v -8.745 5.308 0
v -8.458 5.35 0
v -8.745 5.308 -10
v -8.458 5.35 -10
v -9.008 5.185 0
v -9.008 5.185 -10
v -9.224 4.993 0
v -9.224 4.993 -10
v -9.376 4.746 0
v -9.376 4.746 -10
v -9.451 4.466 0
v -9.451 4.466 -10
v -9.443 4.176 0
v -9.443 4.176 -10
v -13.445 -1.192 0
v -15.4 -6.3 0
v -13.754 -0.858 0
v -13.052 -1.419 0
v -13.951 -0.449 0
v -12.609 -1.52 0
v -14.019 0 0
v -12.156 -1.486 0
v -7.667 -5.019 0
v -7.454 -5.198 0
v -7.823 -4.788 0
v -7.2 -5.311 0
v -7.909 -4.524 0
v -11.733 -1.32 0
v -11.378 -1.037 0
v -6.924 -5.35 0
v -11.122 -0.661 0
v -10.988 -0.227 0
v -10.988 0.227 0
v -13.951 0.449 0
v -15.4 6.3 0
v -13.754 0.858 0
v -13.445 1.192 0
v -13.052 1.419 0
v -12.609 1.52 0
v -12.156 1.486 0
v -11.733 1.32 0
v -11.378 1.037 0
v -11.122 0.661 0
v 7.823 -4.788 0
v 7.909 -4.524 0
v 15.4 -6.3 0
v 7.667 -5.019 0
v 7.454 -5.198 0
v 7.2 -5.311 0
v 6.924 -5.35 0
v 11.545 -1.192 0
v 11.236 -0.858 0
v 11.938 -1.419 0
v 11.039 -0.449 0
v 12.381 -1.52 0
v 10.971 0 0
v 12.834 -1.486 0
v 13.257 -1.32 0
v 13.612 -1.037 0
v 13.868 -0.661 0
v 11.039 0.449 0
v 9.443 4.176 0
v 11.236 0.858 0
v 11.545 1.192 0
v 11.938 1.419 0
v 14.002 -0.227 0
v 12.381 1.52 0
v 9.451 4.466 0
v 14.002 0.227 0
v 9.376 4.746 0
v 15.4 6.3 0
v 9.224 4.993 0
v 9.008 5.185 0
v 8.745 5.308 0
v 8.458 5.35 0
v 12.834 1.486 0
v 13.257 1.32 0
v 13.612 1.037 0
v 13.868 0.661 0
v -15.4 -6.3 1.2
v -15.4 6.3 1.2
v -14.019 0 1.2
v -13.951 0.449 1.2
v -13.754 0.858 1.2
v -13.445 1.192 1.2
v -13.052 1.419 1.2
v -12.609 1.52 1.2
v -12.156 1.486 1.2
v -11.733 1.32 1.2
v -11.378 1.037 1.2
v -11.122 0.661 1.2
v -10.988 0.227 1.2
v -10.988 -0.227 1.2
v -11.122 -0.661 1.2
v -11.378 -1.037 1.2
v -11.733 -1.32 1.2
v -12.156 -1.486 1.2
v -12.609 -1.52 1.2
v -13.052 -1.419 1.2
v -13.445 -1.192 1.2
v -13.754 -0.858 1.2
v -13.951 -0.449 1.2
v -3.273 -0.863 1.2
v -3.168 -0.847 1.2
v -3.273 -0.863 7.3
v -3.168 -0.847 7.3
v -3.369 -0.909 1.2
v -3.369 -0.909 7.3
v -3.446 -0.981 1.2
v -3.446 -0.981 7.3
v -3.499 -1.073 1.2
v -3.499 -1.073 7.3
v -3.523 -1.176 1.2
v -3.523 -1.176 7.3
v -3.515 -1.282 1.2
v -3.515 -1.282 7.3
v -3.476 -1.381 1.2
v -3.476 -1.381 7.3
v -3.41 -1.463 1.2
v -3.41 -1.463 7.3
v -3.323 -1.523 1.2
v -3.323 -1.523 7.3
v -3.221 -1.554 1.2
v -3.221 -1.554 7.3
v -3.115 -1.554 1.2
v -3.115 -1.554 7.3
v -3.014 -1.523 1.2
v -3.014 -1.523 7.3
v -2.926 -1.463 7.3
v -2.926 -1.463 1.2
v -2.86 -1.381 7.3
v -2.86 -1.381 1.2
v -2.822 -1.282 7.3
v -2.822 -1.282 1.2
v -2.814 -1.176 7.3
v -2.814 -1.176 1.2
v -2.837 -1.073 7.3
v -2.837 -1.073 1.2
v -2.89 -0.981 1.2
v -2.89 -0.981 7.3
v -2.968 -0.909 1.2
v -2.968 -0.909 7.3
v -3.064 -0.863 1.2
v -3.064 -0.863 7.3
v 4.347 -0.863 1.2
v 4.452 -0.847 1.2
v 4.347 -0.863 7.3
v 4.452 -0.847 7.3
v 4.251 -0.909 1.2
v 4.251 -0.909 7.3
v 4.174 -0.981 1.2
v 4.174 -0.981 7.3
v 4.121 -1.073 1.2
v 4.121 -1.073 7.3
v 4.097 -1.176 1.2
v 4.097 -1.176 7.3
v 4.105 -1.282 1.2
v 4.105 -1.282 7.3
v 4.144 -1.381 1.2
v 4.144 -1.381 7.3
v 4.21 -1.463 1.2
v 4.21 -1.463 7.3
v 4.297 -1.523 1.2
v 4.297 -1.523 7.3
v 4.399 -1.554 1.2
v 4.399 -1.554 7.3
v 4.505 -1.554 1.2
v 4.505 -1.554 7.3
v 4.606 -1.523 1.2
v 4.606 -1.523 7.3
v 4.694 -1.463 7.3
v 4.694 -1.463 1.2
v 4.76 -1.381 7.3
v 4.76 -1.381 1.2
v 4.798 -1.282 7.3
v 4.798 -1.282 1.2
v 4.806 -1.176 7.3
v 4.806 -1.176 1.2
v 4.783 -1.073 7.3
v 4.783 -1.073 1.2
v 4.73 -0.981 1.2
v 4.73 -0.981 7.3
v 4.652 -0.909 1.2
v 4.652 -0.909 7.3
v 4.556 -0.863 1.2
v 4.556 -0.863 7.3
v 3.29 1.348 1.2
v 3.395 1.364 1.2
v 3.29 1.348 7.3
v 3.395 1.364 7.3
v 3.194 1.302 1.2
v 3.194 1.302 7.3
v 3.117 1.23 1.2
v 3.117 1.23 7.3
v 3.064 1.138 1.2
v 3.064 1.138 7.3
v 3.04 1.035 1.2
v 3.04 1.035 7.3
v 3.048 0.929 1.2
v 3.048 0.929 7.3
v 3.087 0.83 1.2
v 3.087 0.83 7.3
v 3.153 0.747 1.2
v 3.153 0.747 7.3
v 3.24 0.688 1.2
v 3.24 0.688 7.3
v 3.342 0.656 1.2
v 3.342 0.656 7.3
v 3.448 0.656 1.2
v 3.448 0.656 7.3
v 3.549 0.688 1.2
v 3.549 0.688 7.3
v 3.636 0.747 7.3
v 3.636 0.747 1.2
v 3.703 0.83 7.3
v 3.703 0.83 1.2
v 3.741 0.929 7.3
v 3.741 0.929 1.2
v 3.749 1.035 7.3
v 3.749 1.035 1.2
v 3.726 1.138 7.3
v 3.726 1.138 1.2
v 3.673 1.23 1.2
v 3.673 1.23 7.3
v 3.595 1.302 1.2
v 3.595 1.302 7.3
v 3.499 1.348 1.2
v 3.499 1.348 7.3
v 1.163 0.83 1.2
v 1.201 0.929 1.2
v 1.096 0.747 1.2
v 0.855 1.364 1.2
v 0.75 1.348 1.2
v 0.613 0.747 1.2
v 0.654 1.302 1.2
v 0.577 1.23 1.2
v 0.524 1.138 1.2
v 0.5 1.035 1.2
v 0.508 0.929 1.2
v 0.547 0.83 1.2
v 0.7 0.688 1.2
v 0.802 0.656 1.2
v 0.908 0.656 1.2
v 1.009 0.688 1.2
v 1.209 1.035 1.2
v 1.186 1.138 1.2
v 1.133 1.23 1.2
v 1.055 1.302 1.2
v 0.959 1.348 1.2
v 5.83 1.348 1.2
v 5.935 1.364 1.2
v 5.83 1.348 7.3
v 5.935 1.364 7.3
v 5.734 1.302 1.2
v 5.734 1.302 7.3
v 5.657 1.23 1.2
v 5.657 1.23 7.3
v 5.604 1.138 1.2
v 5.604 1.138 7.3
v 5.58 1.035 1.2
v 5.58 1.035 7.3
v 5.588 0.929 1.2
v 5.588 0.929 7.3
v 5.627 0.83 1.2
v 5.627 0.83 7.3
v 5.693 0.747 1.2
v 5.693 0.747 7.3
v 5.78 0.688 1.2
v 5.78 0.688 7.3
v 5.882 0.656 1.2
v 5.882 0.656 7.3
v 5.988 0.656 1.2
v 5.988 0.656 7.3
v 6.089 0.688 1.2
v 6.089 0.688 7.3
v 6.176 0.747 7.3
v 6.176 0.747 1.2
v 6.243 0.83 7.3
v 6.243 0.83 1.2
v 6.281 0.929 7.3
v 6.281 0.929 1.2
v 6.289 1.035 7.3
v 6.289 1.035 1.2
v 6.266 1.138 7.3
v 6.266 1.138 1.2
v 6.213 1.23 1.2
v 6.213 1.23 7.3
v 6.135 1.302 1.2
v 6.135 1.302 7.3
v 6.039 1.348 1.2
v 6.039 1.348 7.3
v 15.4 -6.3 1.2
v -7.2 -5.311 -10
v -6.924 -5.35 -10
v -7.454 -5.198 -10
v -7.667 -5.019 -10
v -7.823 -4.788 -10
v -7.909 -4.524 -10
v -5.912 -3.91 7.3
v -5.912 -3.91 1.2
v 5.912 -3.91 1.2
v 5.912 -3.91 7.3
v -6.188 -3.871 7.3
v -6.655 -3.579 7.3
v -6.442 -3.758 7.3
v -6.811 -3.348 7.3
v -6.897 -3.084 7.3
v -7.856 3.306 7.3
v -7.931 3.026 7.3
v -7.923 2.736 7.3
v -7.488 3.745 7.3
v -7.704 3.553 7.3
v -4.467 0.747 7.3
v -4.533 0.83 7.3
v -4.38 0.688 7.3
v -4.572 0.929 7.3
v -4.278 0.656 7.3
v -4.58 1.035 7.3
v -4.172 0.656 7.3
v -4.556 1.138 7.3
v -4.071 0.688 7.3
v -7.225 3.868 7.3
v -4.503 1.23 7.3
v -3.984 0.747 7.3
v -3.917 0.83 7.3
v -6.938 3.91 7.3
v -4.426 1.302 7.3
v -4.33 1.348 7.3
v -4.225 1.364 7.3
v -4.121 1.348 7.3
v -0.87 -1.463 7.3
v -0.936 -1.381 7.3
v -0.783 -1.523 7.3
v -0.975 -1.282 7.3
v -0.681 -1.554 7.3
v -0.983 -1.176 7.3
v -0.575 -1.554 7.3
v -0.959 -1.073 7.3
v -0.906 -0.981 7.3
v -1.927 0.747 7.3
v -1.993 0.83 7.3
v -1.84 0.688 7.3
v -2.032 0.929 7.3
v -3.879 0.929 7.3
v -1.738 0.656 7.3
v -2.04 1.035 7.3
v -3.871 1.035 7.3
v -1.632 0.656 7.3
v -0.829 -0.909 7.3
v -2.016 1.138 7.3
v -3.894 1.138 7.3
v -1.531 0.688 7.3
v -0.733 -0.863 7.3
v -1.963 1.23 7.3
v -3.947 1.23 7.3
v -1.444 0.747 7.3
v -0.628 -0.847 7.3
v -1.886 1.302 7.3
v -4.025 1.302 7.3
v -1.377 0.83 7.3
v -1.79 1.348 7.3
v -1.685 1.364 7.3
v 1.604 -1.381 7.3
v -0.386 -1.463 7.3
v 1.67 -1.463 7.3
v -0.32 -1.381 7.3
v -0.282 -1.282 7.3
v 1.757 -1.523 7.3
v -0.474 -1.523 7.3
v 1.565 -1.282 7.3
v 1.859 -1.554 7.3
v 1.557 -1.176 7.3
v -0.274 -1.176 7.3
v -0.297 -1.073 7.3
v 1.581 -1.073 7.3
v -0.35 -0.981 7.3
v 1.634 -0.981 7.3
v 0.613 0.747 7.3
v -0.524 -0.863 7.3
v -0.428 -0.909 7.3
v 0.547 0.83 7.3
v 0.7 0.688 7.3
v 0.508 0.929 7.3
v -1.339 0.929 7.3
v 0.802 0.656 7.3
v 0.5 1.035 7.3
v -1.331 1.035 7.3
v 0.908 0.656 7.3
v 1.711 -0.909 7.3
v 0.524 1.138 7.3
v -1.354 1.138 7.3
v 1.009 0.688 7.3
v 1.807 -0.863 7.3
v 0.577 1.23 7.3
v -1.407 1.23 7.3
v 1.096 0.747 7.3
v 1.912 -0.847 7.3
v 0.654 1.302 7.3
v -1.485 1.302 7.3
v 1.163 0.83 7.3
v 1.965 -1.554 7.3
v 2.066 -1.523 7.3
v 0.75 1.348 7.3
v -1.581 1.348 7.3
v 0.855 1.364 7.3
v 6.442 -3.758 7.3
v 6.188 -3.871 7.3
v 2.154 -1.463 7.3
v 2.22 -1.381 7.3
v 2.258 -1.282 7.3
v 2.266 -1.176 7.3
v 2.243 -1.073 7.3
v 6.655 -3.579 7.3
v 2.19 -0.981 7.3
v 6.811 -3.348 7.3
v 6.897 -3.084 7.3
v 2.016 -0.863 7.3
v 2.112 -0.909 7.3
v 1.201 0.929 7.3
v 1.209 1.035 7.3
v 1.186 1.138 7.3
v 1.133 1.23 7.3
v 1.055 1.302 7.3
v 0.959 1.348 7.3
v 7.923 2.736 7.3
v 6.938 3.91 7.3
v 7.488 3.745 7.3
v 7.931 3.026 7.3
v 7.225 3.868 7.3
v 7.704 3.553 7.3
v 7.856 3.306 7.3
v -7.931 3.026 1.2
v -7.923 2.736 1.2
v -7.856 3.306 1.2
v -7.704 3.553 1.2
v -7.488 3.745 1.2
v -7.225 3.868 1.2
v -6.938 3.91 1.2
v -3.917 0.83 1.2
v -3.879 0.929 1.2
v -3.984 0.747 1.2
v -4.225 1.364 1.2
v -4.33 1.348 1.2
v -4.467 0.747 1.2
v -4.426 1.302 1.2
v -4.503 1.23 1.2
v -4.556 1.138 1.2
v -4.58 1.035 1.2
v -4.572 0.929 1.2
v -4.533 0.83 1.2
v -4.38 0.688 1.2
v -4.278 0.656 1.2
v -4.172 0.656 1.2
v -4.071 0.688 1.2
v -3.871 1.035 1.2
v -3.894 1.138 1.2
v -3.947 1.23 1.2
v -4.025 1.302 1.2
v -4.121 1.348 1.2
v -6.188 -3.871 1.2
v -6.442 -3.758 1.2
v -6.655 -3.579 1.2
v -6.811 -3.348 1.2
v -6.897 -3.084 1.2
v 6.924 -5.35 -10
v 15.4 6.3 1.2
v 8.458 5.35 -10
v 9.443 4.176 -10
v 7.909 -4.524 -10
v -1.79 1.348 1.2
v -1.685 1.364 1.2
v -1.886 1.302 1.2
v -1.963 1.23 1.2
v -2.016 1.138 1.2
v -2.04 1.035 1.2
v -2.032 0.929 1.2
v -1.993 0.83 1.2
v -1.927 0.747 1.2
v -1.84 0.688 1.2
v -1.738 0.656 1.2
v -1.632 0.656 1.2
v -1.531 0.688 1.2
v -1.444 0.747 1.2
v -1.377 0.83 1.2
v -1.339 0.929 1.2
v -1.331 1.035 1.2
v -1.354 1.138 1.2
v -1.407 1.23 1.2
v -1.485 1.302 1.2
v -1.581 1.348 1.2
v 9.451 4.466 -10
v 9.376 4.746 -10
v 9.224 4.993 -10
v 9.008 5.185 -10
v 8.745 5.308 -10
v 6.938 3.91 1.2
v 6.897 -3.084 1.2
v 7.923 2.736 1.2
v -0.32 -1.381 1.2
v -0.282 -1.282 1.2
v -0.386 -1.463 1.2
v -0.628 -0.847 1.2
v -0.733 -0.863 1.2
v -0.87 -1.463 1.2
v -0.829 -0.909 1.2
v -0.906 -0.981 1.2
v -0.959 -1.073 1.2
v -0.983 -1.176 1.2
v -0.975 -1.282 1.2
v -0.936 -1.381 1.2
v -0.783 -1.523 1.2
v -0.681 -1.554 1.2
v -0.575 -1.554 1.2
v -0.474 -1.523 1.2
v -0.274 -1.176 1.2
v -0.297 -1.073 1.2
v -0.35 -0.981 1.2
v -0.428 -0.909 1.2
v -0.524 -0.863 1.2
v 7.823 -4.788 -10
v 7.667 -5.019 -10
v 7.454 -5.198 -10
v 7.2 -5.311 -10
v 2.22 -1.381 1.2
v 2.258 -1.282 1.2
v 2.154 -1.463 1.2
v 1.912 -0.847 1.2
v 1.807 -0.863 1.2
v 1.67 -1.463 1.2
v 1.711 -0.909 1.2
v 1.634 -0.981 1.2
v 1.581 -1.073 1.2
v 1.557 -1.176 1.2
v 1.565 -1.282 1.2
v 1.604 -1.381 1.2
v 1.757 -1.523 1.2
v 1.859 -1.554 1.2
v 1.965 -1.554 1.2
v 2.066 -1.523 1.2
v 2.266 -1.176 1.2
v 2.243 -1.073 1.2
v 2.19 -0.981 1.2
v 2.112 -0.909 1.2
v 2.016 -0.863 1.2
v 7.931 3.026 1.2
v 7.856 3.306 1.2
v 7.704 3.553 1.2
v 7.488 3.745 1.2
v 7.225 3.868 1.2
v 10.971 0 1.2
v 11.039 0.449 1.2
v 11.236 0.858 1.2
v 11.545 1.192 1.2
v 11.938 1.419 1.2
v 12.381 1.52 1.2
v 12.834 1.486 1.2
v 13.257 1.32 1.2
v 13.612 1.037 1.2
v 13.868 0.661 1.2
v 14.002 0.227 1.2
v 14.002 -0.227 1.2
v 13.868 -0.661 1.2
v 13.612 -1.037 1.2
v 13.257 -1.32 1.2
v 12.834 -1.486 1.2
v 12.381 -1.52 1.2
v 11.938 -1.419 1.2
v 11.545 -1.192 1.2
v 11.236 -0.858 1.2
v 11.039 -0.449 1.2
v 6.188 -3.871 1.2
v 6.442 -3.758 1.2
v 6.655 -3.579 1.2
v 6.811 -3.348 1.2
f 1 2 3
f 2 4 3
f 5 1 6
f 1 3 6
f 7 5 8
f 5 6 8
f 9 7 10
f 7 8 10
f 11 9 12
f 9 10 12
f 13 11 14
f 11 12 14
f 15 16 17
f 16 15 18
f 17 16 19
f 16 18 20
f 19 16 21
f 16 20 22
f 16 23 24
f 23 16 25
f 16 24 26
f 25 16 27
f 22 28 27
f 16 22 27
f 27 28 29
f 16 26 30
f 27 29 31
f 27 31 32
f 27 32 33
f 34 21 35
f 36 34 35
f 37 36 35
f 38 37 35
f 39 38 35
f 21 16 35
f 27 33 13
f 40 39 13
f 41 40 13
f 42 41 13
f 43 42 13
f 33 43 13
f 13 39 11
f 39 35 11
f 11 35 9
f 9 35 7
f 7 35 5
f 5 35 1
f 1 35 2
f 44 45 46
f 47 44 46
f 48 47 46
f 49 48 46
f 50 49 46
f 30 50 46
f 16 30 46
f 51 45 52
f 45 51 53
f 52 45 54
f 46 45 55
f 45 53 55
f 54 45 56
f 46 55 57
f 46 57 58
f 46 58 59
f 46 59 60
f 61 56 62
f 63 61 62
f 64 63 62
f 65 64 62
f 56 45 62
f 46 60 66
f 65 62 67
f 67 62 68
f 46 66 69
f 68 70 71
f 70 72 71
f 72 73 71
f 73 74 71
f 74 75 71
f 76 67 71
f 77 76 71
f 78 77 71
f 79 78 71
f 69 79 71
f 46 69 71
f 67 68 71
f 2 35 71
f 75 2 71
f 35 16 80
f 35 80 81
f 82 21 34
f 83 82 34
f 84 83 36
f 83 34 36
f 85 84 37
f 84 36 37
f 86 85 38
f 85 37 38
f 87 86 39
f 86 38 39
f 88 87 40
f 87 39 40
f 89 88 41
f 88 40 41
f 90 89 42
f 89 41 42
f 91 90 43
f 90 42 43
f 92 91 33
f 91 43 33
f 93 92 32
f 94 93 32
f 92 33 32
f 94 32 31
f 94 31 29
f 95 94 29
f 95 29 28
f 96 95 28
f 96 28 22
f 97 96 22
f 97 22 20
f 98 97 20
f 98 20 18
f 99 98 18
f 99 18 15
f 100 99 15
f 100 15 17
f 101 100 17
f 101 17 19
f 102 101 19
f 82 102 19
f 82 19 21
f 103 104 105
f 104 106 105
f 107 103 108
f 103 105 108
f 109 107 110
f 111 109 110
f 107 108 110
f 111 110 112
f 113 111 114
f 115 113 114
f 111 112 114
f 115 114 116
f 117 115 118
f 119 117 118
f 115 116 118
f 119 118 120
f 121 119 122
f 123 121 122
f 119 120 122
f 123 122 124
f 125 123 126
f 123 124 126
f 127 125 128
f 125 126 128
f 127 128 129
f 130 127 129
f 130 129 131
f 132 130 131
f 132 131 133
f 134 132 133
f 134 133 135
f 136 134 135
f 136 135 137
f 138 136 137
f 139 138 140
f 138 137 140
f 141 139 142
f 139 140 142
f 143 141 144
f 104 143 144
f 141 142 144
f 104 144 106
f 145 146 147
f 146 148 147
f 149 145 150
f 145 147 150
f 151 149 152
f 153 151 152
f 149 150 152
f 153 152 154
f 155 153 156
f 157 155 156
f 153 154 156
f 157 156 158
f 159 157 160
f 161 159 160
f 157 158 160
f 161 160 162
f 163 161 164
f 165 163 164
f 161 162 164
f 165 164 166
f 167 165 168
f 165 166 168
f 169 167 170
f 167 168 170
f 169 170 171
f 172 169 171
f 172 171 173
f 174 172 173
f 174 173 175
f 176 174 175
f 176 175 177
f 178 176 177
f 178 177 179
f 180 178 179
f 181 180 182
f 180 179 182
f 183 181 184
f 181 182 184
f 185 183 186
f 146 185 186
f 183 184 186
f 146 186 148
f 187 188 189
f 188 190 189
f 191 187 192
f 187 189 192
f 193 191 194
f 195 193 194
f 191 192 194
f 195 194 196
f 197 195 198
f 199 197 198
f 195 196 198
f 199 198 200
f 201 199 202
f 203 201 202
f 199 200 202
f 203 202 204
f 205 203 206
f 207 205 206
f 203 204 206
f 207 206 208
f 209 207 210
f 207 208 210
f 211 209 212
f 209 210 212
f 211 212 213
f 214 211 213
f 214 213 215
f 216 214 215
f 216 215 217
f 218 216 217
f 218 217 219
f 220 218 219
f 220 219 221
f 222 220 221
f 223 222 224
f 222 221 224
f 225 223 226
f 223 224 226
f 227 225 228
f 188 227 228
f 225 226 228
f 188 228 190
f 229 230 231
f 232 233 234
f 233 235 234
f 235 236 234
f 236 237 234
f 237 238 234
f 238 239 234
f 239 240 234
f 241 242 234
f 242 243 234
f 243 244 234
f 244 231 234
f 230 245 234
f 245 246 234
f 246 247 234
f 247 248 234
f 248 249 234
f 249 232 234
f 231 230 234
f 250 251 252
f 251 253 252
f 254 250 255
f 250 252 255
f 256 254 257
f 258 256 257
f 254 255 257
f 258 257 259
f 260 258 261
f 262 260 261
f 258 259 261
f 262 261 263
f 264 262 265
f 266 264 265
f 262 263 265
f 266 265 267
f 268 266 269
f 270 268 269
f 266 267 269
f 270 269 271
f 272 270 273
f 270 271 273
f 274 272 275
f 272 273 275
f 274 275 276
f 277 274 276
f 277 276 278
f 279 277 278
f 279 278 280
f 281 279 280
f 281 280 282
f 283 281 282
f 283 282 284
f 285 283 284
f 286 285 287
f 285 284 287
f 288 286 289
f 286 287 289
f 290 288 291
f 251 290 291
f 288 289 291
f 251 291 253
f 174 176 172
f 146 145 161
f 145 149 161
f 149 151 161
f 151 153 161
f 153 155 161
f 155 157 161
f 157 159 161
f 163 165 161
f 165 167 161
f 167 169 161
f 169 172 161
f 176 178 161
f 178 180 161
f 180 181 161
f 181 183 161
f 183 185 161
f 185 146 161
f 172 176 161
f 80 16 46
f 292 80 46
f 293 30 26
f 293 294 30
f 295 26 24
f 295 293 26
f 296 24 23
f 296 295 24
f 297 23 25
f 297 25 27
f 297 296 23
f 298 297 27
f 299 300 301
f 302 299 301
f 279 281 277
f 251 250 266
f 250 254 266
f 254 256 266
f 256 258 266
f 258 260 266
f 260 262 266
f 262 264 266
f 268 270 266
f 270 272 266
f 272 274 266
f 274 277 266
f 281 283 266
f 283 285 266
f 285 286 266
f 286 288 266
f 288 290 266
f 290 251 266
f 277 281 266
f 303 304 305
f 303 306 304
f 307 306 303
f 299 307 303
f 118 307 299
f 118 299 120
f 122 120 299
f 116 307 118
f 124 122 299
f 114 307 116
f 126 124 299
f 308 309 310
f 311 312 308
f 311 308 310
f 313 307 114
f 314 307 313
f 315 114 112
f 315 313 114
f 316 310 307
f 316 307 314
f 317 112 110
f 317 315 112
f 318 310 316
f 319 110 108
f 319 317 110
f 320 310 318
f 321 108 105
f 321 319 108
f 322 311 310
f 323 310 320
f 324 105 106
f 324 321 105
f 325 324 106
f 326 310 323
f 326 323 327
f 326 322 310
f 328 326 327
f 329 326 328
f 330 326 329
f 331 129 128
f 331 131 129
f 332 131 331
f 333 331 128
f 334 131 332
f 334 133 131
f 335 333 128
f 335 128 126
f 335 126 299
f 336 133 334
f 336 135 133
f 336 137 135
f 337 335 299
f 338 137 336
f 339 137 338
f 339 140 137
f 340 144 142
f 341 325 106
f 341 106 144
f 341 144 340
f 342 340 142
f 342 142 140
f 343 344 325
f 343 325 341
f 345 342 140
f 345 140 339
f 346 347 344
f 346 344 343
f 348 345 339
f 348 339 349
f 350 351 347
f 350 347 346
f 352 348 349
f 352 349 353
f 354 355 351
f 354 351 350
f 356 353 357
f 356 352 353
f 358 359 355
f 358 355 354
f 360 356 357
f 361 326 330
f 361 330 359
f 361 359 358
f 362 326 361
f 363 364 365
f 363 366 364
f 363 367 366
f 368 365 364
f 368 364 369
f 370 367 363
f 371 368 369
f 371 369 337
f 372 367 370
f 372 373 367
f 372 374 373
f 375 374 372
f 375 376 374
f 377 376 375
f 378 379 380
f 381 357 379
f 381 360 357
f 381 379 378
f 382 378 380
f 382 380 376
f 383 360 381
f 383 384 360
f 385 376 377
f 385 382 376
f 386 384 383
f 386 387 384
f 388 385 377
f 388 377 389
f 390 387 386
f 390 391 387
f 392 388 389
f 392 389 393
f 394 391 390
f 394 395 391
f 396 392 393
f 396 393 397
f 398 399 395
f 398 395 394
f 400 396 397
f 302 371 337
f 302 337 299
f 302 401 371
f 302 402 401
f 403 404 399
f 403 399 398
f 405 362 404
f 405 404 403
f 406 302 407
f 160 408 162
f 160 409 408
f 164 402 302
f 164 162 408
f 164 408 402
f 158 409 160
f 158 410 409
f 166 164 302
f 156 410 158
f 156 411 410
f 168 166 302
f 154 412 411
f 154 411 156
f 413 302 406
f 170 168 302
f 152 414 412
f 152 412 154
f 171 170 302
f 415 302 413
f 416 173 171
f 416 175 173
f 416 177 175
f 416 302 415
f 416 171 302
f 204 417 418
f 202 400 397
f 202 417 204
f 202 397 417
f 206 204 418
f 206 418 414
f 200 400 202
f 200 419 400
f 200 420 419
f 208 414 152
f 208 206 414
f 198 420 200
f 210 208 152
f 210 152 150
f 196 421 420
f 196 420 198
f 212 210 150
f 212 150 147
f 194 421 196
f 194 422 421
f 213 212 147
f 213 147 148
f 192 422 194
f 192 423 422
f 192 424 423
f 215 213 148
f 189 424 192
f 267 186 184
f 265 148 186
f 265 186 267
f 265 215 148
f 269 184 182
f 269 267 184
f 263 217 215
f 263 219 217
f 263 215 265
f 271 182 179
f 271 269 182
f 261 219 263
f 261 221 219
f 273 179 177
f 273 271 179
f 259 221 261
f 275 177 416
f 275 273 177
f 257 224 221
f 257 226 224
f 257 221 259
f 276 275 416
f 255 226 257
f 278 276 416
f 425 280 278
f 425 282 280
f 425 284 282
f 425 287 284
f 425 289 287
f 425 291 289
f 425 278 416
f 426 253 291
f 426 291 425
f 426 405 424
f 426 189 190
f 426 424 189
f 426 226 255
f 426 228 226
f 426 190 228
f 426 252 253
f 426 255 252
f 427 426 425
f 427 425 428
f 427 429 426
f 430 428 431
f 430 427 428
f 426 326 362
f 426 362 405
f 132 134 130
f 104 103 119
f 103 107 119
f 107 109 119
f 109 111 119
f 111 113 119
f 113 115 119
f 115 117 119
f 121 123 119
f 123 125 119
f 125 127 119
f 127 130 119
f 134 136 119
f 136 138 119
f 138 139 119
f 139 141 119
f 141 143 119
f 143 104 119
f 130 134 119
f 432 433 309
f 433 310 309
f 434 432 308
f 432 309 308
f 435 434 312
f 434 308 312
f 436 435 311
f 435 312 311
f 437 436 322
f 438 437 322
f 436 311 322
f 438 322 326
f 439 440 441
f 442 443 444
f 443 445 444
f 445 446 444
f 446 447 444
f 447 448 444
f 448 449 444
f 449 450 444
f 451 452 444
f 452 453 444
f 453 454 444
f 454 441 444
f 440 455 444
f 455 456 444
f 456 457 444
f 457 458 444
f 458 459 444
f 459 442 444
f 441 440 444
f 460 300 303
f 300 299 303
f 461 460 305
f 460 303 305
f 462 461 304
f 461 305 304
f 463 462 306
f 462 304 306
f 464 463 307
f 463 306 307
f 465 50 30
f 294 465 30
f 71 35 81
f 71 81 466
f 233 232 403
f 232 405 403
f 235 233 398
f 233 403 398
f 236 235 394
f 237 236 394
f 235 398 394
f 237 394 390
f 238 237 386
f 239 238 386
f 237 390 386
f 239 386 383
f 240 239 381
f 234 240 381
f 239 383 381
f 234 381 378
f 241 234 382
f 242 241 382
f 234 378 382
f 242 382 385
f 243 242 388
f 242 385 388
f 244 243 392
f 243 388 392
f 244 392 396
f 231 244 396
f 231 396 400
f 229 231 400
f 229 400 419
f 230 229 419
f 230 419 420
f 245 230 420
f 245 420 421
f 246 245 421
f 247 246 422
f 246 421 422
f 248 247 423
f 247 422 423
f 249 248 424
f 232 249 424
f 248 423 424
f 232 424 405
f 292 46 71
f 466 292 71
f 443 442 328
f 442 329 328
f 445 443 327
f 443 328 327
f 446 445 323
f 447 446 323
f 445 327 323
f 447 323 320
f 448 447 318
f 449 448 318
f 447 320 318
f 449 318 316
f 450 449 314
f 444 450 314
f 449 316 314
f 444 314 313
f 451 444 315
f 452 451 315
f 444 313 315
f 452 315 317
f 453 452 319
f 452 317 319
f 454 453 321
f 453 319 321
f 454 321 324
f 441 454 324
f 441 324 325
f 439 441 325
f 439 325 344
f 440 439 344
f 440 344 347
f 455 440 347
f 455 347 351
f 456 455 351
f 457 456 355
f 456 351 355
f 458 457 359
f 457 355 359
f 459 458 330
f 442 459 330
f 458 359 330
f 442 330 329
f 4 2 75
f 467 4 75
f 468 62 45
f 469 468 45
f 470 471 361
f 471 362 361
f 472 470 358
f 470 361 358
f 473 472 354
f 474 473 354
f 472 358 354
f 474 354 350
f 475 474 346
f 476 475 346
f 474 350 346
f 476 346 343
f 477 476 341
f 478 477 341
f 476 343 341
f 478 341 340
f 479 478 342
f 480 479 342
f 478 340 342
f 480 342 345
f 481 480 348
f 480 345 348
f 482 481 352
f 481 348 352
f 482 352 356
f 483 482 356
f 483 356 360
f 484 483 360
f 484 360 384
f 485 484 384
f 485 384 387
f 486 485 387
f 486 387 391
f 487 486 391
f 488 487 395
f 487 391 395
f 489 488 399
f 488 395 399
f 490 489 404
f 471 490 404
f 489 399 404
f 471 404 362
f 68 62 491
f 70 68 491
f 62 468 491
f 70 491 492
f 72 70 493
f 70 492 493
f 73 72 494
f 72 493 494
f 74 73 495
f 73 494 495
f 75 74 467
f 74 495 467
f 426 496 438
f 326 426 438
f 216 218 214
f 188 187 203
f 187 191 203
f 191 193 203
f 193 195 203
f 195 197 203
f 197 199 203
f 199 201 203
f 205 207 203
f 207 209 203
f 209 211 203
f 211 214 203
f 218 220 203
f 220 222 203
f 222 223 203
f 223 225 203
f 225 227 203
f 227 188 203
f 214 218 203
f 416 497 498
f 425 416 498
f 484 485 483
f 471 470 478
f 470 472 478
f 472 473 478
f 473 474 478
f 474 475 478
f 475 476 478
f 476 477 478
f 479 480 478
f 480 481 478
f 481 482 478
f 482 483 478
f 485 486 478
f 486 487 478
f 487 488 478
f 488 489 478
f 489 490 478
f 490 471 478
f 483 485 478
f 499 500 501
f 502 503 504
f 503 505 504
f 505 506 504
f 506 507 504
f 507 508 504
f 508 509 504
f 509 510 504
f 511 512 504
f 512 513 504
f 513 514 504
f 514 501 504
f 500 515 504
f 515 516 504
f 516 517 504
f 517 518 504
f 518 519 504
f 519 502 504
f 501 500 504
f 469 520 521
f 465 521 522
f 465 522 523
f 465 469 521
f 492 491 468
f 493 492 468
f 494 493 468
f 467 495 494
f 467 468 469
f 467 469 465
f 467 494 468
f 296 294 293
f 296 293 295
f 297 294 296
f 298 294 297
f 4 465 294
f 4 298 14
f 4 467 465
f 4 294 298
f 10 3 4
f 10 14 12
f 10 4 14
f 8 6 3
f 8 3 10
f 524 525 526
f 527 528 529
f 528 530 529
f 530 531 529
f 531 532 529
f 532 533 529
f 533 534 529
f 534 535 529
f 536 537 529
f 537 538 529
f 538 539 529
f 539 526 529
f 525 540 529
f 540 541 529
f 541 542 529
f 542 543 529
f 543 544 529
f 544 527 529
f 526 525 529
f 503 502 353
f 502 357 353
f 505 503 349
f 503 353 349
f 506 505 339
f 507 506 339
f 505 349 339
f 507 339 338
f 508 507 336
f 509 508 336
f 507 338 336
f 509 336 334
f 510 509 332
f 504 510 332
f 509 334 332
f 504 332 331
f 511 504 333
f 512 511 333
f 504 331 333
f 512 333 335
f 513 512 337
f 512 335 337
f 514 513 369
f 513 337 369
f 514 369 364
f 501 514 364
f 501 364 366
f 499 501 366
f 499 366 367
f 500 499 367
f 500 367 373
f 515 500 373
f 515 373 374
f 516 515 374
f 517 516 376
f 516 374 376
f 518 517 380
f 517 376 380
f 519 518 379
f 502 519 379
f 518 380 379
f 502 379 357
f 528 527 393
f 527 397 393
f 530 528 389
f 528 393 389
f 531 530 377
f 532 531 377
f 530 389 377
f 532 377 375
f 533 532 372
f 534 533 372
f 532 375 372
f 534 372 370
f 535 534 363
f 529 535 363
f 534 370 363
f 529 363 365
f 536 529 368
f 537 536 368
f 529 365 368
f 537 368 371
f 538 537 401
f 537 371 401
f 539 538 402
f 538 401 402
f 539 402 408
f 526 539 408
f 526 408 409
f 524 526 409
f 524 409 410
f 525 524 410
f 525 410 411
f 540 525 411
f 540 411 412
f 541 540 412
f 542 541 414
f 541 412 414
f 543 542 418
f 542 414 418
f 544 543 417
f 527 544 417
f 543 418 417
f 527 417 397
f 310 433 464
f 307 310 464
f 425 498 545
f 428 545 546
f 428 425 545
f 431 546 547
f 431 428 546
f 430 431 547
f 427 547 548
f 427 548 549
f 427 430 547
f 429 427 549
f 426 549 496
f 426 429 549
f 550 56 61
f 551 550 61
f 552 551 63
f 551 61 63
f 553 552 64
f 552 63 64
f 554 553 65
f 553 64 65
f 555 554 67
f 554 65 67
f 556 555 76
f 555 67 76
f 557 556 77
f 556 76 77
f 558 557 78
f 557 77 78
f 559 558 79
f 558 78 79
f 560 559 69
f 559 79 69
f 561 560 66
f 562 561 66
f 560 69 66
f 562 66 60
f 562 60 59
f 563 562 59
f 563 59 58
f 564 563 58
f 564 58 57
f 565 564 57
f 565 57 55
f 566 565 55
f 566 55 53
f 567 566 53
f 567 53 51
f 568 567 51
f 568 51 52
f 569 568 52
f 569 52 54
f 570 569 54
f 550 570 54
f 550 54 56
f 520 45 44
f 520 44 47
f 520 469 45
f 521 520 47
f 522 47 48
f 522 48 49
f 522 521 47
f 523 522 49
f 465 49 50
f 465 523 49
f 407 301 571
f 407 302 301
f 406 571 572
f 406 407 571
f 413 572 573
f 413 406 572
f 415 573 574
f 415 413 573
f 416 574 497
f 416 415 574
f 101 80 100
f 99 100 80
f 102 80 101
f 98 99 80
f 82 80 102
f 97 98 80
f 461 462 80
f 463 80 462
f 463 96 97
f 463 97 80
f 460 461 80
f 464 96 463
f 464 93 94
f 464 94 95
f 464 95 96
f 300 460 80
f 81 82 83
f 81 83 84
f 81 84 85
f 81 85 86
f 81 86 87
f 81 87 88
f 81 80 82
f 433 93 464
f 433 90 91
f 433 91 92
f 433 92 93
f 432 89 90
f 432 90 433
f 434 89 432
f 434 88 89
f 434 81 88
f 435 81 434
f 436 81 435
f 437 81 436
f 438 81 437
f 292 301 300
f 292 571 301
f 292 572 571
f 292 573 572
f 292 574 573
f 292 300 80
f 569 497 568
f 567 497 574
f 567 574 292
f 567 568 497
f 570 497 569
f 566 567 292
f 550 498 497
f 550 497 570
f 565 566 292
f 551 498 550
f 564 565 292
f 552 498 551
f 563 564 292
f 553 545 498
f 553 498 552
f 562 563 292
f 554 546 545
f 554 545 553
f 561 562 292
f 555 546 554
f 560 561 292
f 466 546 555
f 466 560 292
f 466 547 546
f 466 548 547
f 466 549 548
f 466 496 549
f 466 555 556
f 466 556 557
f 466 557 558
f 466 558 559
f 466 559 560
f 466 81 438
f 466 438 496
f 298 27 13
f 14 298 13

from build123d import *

# Parameters (mm, degrees)
SKETCH_1_W             = 30.8
SKETCH_1_H             = 12.6
EXTRUDE_1_DEPTH        = 1.2
EXTRUDE_2_DEPTH        = 6.1
EXTRUDE_3_DEPTH        = 10
SKETCH_5_W             = 0.3556
SKETCH_5_H             = 6.1
SKETCH_6_W             = 0.3556
SKETCH_6_H             = 6.1
PATTERN_LINEAR_1_COUNT = 5
PATTERN_LINEAR_1_PITCH = 2.54
PATTERN_LINEAR_2_COUNT = 4
PATTERN_LINEAR_2_PITCH = 2.54
HOLE_WIZARD_3_2_D      = 3.048
FILLET_1_R             = 1


with BuildPart() as part:
    # ｽｹｯﾁ1 → ﾎﾞｽ - 押し出し1 (new body)
    with BuildSketch(Plane.XY):
        Rectangle(SKETCH_1_W, SKETCH_1_H)
    extrude(amount=EXTRUDE_1_DEPTH)

    # ｽｹｯﾁ2 → ﾎﾞｽ - 押し出し2 (add)
    with BuildSketch(Plane.XY.offset(1.2)):
        Polygon((-6.751123011, -3.91), (6.751123011, -3.91), (8.13, 3.91), (-8.13, 3.91), align=None)
    extrude(amount=EXTRUDE_2_DEPTH)

    # ｽｹｯﾁ3 → ﾎﾞｽ - 押し出し3 (add)
    with BuildSketch(Plane(origin=(0, 0, 0), x_dir=(-1, 0, 0), z_dir=(0, 0, -1))):
        Polygon((-7.763301306, -5.35), (7.763301306, -5.35), (9.65, 5.35), (-9.65, 5.35), align=None)
    extrude(amount=EXTRUDE_3_DEPTH)

    # ｽｹｯﾁ5 → #0000 すきま穴1 (revolve, cut)
    with BuildSketch(Plane(origin=(-4.225439316, 1.008007938, 1.2), x_dir=(0, 1, 0), z_dir=(1, 0, 0))):
        with Locations((0.1778, 3.05)):
            Rectangle(SKETCH_5_W, SKETCH_5_H)
    hole_wizard_0000_1 = revolve(axis=Axis((-4.225439316, 1.008007938, -5.15), (0, 0, 1)), mode=Mode.SUBTRACT)

    # ｽｹｯﾁ6 → #0000 すきま穴2 (revolve, cut)
    with BuildSketch(Plane(origin=(-3.168321124, -1.202810505, 1.2), x_dir=(0, 1, 0), z_dir=(1, 0, 0))):
        with Locations((0.1778, 3.05)):
            Rectangle(SKETCH_6_W, SKETCH_6_H)
    hole_wizard_0000_2 = revolve(axis=Axis((-3.168321124, -1.202810505, -5.15), (0, 0, 1)), mode=Mode.SUBTRACT)

    # 直線ﾊﾟﾀｰﾝ1: #0000 すきま穴1 ×5
    with Locations(*[(i * PATTERN_LINEAR_1_PITCH, 0, 0) for i in range(1, PATTERN_LINEAR_1_COUNT)]):
        add(hole_wizard_0000_1, mode=Mode.SUBTRACT)

    # 直線ﾊﾟﾀｰﾝ2: #0000 すきま穴2 ×4
    with Locations(*[(i * PATTERN_LINEAR_2_PITCH, 0, 0) for i in range(1, PATTERN_LINEAR_2_COUNT)]):
        add(hole_wizard_0000_2, mode=Mode.SUBTRACT)

    # #3 すきま穴2 (through all)
    with Locations(Plane(origin=(-12.495, 0, 1.2), x_dir=(1, 0, 0), z_dir=(0, 0, 1))):
        with Locations((0, 0), (24.99, 0)):
            Hole(HOLE_WIZARD_3_2_D / 2)

    # ﾌｨﾚｯﾄ1
    fillet_1_edges = [part.edges().sort_by_distance(p)[0] for p in [
        (6.751123011, -3.91, 4.25),
        (8.13, 3.91, 4.25),
        (-8.13, 3.91, 4.25),
        (-6.751123011, -3.91, 4.25),
        (-7.763301306, -5.35, -5),
        (-9.65, 5.35, -5),
        (9.65, 5.35, -5),
        (7.763301306, -5.35, -5),
    ]]
    fillet(fillet_1_edges, radius=FILLET_1_R)


solid = part.part
